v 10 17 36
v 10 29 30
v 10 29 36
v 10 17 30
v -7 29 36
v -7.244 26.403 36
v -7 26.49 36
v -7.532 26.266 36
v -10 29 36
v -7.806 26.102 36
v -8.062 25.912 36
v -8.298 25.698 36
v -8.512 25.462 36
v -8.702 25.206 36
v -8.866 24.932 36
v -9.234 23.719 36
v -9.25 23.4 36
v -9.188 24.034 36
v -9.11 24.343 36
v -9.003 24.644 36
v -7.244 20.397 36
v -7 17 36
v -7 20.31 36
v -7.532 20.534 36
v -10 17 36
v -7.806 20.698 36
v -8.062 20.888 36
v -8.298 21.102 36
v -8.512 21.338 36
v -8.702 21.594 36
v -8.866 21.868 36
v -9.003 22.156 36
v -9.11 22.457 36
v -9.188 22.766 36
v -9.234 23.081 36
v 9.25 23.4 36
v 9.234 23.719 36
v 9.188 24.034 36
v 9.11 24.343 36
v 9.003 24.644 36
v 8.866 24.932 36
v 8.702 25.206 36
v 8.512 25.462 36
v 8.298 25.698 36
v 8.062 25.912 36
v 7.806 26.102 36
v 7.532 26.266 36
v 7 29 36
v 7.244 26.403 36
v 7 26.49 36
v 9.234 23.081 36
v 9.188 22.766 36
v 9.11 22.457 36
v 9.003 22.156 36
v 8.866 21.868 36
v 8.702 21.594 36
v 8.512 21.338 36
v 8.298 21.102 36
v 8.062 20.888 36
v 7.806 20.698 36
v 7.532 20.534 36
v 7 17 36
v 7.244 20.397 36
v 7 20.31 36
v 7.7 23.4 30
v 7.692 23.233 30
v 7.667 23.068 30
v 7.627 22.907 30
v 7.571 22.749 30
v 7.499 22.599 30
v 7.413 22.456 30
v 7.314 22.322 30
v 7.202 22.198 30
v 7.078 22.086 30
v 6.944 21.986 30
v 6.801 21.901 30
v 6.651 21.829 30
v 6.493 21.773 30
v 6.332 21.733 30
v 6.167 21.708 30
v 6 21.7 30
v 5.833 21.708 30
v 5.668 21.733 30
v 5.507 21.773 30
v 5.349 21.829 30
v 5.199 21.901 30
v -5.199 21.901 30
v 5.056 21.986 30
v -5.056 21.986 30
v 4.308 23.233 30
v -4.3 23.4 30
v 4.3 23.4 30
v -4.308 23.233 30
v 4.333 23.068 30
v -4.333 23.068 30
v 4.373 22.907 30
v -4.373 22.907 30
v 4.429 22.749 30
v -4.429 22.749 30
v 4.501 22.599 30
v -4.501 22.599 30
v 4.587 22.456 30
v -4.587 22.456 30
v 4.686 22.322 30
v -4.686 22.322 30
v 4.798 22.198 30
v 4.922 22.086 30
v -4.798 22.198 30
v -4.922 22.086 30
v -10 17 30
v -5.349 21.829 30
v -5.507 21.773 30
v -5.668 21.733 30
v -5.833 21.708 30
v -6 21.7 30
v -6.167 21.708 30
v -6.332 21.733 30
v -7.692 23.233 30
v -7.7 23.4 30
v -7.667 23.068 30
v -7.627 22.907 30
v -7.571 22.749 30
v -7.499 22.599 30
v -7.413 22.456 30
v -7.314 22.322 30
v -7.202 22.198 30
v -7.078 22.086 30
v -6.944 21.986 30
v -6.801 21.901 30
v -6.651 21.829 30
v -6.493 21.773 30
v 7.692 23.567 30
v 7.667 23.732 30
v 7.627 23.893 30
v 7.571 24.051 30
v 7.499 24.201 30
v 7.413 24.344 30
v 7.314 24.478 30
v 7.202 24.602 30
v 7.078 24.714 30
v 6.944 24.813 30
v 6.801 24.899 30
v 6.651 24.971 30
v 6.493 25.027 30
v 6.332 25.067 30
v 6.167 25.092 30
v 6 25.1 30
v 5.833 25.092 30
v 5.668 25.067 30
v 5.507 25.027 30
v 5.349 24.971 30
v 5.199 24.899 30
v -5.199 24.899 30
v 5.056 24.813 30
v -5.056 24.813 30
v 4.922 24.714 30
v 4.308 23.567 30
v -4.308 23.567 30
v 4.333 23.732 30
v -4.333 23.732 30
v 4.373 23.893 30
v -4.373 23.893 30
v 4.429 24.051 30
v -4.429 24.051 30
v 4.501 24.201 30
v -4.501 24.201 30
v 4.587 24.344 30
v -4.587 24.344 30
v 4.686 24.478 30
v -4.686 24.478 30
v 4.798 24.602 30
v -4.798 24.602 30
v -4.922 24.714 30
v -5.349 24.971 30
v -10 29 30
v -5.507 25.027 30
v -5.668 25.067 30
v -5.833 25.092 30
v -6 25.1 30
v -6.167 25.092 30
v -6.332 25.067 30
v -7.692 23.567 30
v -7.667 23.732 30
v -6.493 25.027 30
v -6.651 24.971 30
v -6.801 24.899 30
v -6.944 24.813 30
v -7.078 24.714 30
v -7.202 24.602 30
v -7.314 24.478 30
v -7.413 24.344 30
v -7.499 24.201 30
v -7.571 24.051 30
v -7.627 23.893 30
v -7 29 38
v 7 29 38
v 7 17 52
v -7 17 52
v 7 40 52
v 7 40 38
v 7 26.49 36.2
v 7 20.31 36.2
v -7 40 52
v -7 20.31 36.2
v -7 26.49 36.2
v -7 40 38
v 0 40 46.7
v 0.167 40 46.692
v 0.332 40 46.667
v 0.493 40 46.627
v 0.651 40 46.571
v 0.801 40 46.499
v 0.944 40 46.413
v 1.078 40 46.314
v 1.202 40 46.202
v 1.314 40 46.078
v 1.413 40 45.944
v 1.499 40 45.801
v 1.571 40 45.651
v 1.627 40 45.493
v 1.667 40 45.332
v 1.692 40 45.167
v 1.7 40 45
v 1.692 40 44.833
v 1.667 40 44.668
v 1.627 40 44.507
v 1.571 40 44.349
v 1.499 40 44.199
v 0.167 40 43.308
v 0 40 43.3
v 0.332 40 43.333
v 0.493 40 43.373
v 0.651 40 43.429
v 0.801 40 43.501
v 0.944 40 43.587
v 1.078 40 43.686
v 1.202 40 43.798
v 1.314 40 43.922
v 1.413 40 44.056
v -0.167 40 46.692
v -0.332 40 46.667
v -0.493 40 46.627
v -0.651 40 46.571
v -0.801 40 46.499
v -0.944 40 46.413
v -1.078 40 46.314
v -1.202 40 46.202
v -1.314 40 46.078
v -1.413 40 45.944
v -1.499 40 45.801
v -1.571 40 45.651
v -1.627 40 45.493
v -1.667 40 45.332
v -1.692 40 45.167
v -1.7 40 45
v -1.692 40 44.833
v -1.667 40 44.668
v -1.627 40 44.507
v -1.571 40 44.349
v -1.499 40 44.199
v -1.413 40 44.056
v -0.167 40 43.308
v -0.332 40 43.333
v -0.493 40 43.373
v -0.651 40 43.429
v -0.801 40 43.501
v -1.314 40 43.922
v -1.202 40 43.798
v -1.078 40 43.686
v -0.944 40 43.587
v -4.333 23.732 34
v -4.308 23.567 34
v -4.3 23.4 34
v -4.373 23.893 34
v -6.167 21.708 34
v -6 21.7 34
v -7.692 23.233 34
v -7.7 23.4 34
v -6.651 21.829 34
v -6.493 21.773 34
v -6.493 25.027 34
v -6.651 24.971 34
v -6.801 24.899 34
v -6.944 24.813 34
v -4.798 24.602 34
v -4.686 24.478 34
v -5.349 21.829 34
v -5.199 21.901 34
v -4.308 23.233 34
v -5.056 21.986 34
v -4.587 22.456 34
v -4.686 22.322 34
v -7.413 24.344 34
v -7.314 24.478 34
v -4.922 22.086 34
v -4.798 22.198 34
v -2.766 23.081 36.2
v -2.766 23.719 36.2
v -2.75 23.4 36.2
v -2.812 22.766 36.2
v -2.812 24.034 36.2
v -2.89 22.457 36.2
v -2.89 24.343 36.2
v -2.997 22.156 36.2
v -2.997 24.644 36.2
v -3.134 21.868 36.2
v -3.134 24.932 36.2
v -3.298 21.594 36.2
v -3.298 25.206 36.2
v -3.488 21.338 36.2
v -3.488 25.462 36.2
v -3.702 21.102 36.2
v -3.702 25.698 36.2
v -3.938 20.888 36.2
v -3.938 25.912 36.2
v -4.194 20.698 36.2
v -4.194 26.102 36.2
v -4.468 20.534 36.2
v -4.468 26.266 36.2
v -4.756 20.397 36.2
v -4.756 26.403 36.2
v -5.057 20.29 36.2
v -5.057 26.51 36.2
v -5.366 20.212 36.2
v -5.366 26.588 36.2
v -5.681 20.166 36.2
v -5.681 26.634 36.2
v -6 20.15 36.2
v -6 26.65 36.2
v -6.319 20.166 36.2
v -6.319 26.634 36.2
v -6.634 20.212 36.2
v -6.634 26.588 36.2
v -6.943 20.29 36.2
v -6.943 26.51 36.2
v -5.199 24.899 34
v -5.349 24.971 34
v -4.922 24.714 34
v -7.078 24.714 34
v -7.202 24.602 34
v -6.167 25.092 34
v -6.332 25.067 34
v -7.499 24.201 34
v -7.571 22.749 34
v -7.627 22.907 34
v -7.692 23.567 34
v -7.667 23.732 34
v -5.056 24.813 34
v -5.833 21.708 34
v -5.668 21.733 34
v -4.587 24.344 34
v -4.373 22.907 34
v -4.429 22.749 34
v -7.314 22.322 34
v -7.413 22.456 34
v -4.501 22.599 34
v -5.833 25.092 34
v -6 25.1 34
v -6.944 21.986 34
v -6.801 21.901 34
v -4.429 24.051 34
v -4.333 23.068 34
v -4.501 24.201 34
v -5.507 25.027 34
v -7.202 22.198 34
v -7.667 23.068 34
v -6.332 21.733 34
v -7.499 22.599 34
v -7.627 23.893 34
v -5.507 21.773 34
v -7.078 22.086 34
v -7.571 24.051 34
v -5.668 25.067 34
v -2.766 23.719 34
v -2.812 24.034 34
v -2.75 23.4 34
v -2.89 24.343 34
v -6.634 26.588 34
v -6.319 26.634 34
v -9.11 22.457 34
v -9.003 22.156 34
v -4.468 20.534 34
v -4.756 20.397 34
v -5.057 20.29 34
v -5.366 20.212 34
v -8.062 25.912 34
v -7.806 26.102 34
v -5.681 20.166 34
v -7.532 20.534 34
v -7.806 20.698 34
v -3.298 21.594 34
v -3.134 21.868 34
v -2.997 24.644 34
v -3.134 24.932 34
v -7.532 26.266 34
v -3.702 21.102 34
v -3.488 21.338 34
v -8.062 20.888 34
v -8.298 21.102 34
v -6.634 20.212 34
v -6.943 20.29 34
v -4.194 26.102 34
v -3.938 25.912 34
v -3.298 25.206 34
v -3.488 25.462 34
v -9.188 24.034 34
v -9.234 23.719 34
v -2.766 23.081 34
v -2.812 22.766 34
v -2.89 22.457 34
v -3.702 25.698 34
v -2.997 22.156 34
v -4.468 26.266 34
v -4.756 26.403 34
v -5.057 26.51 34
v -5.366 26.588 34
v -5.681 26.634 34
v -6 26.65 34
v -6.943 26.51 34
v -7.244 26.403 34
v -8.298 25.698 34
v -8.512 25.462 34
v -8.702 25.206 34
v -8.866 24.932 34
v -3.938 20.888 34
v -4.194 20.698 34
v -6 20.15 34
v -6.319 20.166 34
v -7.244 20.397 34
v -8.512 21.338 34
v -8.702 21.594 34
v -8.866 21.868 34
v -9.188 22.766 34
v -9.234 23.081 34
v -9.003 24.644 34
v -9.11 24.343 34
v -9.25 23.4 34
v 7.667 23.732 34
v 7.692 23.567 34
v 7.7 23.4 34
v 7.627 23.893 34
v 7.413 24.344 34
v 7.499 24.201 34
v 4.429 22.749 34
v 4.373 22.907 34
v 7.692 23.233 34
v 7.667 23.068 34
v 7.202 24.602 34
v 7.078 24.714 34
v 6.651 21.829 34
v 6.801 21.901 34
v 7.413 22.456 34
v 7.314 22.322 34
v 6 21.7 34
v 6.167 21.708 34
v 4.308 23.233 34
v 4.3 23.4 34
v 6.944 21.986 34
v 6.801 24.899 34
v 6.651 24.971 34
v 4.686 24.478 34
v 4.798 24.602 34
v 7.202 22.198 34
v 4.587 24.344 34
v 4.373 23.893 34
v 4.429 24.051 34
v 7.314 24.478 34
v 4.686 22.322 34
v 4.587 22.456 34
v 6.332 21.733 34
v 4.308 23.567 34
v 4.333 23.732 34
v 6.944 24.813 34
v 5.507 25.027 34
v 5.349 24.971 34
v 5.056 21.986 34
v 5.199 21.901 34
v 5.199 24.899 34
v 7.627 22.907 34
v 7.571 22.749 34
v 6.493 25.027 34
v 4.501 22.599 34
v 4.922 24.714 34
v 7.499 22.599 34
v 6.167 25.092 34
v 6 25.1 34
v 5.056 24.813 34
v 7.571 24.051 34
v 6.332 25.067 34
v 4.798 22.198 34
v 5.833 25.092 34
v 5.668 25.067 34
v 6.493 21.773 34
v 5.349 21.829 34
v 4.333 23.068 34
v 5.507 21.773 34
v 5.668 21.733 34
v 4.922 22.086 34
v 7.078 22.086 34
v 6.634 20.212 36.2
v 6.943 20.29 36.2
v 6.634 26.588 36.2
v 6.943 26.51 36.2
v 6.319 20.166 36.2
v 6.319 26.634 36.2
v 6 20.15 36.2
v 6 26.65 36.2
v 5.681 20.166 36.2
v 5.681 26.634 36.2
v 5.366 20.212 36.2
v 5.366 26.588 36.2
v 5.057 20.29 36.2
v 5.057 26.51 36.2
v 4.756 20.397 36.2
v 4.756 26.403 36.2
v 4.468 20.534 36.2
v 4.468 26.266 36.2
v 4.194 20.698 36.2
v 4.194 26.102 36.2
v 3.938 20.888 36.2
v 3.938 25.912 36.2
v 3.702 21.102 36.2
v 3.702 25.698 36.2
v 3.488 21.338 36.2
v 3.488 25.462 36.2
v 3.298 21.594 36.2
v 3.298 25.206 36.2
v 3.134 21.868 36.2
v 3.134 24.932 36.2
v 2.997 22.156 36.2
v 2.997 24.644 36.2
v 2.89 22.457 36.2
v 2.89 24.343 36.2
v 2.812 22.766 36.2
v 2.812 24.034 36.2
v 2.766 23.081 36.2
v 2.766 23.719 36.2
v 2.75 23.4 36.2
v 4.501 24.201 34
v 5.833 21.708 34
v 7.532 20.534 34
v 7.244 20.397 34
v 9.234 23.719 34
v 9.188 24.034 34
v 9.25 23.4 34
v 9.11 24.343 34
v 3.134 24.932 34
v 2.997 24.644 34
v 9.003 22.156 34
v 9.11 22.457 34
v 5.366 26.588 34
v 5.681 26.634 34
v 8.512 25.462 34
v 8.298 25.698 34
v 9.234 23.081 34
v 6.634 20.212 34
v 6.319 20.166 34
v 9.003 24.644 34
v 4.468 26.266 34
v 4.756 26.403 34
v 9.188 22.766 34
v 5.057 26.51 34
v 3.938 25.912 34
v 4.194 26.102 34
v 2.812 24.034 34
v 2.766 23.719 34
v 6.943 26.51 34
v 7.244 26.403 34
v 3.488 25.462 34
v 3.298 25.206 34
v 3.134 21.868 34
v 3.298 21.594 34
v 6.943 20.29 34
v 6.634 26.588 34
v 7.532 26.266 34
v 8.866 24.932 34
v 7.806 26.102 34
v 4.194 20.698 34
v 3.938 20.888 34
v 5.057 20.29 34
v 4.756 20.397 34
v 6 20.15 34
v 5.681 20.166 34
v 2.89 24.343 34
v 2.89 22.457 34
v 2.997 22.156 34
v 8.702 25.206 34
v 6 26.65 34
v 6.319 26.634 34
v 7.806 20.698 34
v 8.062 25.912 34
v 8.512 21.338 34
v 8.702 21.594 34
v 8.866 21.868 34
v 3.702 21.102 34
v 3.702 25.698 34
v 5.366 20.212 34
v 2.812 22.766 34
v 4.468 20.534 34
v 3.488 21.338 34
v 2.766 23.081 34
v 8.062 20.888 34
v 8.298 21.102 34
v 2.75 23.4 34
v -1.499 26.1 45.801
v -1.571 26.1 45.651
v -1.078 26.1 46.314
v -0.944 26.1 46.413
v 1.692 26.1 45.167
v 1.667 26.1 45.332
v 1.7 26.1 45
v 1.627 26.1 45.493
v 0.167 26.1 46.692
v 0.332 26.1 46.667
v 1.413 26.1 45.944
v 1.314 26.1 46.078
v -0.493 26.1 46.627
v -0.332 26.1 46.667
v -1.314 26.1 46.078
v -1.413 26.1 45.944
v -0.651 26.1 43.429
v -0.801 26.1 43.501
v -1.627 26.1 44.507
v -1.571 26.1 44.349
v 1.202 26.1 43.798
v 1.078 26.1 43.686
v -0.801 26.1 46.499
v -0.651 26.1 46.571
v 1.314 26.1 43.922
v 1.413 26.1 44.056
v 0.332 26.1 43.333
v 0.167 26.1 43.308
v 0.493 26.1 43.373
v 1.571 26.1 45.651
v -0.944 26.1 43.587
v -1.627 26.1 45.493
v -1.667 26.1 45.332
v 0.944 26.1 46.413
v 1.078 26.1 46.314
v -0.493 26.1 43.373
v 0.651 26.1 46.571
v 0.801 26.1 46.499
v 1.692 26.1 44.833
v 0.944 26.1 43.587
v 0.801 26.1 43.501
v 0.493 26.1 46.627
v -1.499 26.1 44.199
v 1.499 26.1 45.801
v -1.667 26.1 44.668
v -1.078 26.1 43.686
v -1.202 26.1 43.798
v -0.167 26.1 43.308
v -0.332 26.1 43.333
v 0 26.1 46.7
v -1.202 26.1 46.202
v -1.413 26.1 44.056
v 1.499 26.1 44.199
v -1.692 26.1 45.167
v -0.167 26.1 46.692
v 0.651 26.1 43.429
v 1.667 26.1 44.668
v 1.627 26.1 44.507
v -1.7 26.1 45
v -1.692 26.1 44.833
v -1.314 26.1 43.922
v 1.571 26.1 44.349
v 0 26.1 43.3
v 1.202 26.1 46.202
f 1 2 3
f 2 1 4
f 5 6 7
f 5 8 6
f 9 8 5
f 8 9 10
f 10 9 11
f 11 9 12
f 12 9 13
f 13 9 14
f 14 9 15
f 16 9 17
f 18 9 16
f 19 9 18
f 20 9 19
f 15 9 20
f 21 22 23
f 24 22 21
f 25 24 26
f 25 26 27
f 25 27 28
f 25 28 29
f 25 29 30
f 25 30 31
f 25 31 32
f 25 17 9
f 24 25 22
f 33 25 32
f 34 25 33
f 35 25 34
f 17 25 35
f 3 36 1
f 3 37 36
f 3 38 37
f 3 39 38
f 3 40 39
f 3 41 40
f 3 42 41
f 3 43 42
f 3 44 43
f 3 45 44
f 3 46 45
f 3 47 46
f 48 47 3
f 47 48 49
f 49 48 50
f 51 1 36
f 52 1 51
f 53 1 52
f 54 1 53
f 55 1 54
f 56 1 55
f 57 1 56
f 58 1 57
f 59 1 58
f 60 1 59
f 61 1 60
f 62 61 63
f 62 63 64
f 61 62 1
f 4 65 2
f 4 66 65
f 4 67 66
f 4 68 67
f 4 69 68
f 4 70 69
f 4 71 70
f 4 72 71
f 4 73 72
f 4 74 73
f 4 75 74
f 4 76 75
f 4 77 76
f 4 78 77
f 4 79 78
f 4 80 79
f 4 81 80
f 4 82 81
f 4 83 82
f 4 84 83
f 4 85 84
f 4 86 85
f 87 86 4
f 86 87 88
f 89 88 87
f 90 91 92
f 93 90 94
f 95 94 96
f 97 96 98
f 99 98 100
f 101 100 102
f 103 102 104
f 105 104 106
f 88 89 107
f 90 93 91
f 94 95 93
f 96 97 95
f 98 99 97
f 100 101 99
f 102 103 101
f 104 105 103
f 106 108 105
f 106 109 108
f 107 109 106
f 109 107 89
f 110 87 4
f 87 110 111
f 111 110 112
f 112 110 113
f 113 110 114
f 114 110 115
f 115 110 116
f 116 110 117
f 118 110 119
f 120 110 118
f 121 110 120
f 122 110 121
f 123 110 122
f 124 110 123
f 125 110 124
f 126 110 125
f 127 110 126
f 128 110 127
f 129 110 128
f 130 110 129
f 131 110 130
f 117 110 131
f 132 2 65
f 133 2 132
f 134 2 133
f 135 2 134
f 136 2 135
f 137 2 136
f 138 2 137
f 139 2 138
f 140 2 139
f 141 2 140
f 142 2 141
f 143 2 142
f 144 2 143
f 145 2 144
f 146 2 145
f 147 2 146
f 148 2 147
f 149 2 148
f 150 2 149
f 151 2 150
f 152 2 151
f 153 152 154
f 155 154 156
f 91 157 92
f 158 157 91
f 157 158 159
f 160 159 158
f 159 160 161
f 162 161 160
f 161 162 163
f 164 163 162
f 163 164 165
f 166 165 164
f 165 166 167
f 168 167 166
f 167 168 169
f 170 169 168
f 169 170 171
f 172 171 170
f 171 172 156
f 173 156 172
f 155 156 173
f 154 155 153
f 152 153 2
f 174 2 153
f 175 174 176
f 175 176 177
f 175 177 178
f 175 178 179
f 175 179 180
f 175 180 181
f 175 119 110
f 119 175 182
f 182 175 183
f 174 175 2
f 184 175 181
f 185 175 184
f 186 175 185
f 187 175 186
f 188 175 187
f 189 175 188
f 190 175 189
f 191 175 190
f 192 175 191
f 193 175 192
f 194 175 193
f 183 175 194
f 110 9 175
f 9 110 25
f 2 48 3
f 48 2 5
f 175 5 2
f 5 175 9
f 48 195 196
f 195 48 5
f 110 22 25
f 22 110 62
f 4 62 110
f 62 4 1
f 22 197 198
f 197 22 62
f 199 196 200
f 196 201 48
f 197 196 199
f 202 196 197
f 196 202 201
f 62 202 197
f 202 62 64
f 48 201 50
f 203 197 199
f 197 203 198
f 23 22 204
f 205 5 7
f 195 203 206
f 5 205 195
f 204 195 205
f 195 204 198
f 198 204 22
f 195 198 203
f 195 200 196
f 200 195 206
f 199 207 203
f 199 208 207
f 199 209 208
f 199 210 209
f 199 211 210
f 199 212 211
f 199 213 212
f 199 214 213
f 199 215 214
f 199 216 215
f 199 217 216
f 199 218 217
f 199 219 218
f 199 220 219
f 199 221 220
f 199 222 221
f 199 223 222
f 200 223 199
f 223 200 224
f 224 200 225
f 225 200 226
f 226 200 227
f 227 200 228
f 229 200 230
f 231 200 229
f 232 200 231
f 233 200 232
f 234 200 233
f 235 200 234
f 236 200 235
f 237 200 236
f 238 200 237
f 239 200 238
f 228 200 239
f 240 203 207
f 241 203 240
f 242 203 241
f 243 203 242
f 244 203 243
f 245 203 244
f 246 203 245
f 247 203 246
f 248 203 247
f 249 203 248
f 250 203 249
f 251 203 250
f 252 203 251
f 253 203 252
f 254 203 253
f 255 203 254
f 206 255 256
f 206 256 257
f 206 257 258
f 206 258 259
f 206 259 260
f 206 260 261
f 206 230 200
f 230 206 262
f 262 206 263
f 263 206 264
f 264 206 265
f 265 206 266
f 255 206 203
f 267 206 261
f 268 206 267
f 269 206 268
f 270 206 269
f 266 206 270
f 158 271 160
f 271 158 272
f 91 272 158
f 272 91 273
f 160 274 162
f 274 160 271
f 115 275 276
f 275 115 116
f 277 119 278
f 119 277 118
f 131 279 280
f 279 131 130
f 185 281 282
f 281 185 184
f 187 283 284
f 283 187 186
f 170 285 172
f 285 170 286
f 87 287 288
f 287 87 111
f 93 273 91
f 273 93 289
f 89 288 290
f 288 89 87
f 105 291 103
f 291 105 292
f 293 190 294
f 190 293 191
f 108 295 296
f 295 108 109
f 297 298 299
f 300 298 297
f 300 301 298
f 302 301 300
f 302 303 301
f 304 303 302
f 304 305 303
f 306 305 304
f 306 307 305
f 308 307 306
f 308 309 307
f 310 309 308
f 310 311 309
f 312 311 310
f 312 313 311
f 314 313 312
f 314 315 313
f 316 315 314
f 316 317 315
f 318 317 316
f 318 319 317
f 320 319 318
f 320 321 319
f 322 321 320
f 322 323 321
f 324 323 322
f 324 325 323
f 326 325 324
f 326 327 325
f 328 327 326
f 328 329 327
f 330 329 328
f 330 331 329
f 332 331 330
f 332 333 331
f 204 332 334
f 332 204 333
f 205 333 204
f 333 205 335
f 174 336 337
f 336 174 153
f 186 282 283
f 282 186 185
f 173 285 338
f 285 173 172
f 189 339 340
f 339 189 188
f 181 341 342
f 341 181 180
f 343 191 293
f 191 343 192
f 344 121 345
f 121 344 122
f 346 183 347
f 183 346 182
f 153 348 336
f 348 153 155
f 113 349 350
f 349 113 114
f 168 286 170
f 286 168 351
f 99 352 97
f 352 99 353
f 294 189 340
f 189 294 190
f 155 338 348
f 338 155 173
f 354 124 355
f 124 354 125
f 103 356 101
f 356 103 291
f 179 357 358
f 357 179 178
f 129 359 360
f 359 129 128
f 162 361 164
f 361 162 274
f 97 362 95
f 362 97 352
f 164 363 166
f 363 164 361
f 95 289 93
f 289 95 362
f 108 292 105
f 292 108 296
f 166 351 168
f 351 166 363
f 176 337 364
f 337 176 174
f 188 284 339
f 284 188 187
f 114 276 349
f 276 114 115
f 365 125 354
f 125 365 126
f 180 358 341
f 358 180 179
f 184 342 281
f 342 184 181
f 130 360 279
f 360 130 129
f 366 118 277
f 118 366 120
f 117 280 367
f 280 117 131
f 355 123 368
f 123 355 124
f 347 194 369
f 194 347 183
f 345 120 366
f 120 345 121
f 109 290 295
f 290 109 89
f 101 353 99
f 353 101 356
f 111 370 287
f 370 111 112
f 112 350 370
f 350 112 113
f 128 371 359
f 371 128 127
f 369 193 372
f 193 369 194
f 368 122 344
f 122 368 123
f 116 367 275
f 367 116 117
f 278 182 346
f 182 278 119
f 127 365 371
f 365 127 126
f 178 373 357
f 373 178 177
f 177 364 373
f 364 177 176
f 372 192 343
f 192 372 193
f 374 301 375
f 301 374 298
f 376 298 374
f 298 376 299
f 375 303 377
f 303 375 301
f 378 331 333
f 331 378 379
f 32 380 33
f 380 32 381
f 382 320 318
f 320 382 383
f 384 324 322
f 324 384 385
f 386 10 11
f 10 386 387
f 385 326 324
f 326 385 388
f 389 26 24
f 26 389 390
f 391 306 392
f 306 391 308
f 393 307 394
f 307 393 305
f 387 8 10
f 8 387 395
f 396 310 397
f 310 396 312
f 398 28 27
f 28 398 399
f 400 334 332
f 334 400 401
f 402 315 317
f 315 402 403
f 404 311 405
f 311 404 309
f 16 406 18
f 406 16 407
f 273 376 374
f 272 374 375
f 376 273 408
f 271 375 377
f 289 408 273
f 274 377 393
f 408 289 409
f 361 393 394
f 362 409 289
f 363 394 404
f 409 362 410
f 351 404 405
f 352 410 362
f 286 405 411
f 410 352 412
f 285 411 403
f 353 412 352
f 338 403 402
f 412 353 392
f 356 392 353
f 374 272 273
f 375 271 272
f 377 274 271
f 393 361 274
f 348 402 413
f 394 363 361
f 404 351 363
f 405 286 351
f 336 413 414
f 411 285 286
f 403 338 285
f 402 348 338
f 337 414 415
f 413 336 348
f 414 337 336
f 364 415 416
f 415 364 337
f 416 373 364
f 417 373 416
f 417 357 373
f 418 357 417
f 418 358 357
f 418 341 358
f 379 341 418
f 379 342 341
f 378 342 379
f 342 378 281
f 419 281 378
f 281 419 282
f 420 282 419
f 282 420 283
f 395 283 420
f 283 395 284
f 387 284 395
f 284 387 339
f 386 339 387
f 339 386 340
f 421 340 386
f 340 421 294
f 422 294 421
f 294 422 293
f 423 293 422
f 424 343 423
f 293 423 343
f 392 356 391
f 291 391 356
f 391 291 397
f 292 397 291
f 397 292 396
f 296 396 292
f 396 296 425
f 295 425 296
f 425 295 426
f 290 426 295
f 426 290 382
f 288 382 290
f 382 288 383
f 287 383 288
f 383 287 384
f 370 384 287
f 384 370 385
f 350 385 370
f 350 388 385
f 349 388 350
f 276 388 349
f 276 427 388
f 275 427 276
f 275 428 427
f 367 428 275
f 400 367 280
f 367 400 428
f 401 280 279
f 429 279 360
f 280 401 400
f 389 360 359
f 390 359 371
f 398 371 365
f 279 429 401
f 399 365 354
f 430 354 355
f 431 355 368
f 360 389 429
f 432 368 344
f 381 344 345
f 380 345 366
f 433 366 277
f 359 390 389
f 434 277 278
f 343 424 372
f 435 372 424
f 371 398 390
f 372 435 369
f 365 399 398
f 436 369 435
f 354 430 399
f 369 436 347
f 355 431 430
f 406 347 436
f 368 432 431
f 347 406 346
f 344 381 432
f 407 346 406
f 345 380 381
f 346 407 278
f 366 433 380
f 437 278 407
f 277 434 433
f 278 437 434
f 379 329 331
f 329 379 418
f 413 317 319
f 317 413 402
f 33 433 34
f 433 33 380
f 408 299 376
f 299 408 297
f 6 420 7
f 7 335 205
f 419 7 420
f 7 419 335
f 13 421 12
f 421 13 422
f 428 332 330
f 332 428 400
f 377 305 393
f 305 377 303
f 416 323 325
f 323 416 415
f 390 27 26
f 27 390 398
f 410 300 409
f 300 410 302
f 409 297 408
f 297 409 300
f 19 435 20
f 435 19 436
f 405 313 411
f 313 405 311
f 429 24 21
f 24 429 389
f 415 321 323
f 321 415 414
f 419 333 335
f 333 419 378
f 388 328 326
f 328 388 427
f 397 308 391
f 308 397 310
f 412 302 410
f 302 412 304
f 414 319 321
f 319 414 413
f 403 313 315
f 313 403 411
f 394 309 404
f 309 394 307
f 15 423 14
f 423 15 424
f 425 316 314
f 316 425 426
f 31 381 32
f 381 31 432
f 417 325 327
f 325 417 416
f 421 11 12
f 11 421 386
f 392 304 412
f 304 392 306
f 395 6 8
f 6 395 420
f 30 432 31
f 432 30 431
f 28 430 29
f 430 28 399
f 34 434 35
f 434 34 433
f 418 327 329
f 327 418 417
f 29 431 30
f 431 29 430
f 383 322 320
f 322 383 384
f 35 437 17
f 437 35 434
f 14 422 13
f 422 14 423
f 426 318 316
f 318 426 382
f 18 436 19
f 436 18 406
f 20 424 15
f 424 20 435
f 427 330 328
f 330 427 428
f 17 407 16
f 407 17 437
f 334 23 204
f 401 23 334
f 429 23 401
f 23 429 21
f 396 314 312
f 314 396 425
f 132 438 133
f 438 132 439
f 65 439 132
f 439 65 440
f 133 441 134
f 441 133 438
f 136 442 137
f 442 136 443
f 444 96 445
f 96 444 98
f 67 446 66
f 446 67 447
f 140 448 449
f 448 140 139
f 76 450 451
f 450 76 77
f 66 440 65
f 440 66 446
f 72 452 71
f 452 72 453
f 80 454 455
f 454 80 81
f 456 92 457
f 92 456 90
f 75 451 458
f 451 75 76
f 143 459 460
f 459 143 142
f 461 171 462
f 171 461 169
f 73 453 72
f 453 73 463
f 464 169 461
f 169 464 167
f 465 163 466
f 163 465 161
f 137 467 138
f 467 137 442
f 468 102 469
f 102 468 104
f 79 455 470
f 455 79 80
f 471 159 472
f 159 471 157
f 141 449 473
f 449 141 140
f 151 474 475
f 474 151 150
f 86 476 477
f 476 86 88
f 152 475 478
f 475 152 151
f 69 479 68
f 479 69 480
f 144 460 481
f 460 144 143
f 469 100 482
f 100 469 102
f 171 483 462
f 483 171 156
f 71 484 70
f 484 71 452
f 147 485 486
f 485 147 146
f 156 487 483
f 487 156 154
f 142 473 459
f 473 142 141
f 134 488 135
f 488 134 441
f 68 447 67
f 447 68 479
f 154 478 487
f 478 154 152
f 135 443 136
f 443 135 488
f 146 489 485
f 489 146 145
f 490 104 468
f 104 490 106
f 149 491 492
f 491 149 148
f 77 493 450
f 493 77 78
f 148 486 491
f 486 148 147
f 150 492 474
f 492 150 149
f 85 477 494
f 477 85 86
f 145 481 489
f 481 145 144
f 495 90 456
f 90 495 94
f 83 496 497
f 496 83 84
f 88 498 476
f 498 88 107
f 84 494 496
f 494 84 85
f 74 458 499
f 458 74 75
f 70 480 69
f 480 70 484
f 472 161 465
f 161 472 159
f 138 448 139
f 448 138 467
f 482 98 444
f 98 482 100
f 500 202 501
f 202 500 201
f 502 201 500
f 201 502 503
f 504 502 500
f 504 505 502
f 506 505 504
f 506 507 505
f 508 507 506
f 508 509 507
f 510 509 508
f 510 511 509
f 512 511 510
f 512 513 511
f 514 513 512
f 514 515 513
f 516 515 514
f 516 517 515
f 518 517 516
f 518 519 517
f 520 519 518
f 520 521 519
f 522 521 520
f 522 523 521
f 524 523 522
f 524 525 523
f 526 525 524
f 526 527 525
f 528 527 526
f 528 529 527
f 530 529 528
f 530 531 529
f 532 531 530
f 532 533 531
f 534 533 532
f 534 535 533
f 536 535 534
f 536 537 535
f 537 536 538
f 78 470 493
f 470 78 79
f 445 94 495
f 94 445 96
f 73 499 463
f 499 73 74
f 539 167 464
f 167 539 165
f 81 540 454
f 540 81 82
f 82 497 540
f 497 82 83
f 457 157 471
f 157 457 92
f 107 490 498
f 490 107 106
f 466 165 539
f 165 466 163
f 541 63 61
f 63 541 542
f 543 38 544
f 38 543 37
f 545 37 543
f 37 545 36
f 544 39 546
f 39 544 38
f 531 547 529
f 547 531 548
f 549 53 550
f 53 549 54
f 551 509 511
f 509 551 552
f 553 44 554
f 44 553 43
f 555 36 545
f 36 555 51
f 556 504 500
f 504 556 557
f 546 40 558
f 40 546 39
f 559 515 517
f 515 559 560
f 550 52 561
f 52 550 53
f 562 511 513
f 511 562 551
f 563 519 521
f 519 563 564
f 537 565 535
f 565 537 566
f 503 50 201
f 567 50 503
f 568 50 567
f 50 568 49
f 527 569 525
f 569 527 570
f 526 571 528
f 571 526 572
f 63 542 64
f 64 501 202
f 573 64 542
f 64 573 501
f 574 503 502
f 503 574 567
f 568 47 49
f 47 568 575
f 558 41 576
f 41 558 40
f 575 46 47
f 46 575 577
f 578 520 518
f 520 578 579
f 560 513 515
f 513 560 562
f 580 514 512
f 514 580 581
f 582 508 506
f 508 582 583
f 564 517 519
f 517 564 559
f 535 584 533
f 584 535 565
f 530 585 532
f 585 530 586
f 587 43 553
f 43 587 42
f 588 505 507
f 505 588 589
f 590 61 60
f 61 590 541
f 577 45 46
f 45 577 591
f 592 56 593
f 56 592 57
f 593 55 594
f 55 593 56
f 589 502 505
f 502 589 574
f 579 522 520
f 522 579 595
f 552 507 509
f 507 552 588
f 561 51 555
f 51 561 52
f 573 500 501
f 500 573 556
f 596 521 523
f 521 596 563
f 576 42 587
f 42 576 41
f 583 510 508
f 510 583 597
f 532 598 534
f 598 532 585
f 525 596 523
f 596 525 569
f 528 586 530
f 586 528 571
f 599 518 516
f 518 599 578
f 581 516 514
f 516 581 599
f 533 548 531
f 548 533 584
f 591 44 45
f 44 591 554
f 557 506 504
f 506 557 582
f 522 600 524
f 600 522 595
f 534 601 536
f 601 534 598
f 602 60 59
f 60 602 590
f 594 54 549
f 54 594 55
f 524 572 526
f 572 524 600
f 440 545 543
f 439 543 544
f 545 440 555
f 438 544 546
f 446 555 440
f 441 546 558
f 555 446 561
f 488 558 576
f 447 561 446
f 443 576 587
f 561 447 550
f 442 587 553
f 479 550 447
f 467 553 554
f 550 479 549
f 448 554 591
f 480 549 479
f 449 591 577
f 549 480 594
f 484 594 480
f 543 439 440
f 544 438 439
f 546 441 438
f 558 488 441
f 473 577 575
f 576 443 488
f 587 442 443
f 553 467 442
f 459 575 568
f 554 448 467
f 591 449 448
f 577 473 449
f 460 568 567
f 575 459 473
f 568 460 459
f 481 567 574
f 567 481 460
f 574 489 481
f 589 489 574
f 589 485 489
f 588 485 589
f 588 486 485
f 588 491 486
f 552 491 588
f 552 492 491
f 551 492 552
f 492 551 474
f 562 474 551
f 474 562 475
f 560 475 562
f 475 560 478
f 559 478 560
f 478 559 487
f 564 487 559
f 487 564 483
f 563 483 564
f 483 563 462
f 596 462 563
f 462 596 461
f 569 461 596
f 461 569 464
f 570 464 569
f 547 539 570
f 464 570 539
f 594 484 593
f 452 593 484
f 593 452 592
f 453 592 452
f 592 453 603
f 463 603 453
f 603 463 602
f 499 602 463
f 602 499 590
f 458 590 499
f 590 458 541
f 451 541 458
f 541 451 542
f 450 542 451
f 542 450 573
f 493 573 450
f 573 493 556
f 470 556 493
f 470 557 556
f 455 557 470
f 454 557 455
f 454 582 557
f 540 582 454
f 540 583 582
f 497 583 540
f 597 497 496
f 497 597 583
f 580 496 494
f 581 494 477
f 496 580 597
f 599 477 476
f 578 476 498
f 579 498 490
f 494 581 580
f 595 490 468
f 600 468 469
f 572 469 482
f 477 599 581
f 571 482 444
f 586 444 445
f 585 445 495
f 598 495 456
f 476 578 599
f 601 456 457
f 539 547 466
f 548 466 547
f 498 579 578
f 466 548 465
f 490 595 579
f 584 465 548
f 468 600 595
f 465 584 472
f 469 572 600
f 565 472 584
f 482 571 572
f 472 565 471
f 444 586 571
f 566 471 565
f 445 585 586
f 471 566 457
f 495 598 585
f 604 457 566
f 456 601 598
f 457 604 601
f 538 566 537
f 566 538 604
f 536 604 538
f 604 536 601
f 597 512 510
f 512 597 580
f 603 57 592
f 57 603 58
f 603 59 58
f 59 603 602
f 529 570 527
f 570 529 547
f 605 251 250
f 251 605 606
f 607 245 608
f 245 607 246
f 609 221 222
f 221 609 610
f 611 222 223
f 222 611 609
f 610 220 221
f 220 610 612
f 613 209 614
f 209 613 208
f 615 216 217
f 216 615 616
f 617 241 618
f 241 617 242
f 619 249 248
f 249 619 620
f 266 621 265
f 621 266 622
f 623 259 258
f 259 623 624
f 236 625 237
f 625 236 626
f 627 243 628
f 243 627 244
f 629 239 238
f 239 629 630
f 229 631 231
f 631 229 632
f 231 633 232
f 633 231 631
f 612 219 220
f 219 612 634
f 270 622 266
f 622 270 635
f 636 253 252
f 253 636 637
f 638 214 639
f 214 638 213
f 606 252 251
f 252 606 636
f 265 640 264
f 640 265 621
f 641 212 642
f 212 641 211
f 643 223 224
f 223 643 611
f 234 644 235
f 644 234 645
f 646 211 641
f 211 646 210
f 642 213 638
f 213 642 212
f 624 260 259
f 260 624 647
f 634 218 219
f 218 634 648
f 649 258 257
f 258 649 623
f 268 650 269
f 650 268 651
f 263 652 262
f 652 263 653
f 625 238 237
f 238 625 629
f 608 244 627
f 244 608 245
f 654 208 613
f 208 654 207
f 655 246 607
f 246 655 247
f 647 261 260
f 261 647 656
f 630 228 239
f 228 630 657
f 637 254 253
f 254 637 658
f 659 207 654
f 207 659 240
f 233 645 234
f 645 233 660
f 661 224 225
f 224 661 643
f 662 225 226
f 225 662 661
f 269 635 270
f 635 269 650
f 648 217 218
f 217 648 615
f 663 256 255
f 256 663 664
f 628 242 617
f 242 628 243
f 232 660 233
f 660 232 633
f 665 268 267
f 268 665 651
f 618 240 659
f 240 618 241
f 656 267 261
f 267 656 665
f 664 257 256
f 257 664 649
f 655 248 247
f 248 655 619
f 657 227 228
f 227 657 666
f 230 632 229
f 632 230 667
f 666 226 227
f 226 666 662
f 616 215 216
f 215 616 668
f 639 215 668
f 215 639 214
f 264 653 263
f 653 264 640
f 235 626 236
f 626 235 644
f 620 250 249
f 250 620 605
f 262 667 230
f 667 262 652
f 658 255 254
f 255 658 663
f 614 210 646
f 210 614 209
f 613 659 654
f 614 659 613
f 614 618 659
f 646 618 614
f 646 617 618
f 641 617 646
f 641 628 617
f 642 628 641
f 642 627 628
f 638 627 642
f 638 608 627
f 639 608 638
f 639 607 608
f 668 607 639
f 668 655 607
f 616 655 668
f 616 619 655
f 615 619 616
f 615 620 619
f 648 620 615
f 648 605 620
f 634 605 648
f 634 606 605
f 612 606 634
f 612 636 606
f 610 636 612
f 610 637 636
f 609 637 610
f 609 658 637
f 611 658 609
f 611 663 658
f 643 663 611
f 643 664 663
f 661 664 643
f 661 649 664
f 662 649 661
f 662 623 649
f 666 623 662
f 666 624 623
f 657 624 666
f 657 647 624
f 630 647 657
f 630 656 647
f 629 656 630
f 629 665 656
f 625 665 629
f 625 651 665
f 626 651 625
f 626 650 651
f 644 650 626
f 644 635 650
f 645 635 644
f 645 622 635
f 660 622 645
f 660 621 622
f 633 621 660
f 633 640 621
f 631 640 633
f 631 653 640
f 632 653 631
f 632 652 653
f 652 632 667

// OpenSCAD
// file: ../lib/utils.scad
// 공통 모듈 (common modules) — 베어링 시트, 볼트 홀 등
include <../config/parameters.scad>

// 베어링 시트 (bearing seat): 압입 공차 적용 포켓
// brg = [내경, 외경, 폭] (예: BRG_608ZZ)
module bearing_seat(brg) {
    cylinder(d = brg[1] + bearing_press_fit, h = brg[2]);
}

// 베어링 시트 + 내륜 도피 홀 (관통)
// wall = 시트 아래 받침 두께
module bearing_pocket(brg, wall = 2) {
    union() {
        translate([0, 0, wall]) bearing_seat(brg);
        // 내륜 접촉 방지: 내경보다 크고 외경보다 작은 도피 홀
        cylinder(d = (brg[0] + brg[1]) / 2, h = wall + 0.1);
    }
}

// 관통 볼트 홀 (clearance hole)
module bolt_hole(d, h) {
    cylinder(d = d + bolt_hole_oversize, h = h);
}

// NEMA 17 모터 마운트 홀 패턴 (CON-004: SF24 = 42각 NEMA 17 호환)
// h = 판 두께
module nema17_mount(h) {
    union() {
        cylinder(d = nema17_pilot_d + clearance_fit, h = h);
        for (x = [-1, 1], y = [-1, 1])
            translate([x * nema17_hole_pitch / 2, y * nema17_hole_pitch / 2, 0])
                bolt_hole(nema17_bolt_d, h);
    }
}

// 숄더 볼트 피벗 홀 (CON-001)
// d = 숄더 직경 (shoulder_d_small | shoulder_d_large)
module pivot_hole(d, h) {
    cylinder(d = d + clearance_fit, h = h);
}

// 베어링 보스 (bearing boss): 출력물 허브에 베어링 내경 직접 안착 (CON-003)
// 내경 기준 압입 — bearing_press_fit(음수)만큼 키운다
module bearing_boss(brg, h) {
    cylinder(d = brg[0] - bearing_press_fit, h = h);
}

// 육각 너트 포켓 (nut pocket) — 차집합용. af = 평면폭(across flats)
module nut_pocket(af, t) {
    cylinder(d = (af + clearance_fit) / cos(30), h = t, $fn = 6);
}

// 리미트 스위치 장착 홀 쌍 (ELE-004) — 차집합용, X축 방향 피치
module ls_mount_holes(h) {
    for (x = [-1, 1])
        translate([x * ls_hole_pitch / 2, 0, 0])
            cylinder(d = ls_hole_d, h = h);
}

// 케이블 가이드 클립 (ELE-005) — 외면 부착형 C-클립, cable_d 다발 직경
module cable_clip(cable_d = 8, t = 4) {
    wall = 2.5;
    difference() {
        cylinder(d = cable_d + 2 * wall, h = t);
        translate([0, 0, -0.1]) cylinder(d = cable_d, h = t + 0.2);
        // 삽입 개구 (개구 폭 = 케이블 직경의 70%)
        translate([0, -cable_d * 0.35, -0.1])
            cube([cable_d, cable_d * 0.7, t + 0.2]);
    }
}

// 평행/구동 링크 바 (625ZZ 양단, MEC-002/MEC-001a)
// len = 피벗 간 거리. 보스 상면에서 베어링 압입, 하면 내륜 도피 홀.
module link_bar(len) {
    boss_t = BRG_625ZZ[2] + 4;
    difference() {
        union() {
            translate([0, -link_bar_w / 2, (boss_t - link_bar_t) / 2])
                cube([len, link_bar_w, link_bar_t]);
            for (x = [0, len])
                translate([x, 0, 0]) cylinder(d = link_boss_d, h = boss_t);
        }
        for (x = [0, len]) {
            translate([x, 0, boss_t - BRG_625ZZ[2]])
                bearing_seat([BRG_625ZZ[0], BRG_625ZZ[1], BRG_625ZZ[2] + 0.1]);
            translate([x, 0, -0.1])
                cylinder(d = (BRG_625ZZ[0] + BRG_625ZZ[1]) / 2, h = boss_t + 0.2);
        }
    }
}

// 지시선(leader) + 빌보드(billboard) 라벨 — 프리뷰용, $vpr 카메라 추종
// p = 앵커(부품 측), v = 지시선 벡터 (라벨은 p+v 위치)
// 주의: 상위 프레임이 회전된 경우 빌보드가 카메라를 향하지 않음 — 월드 프레임에서 호출할 것
module leader_label(p, v, txt, size = 3.2, col = "white") {
    color(col) {
        hull() {
            translate(p) sphere(d = 1.4, $fn = 12);
            translate(p + v) sphere(d = 1.4, $fn = 12);
        }
        translate(p + v) rotate($vpr) translate([2, -size / 2, 0])
            linear_extrude(0.6) text(txt, size = size);
    }
}

// 축 클램프 슬릿 + M3 핀치 볼트 (차집합용)
// bore_d = 클램프 보어, depth = 보어 깊이, body_d = 보스 외경
module shaft_clamp_cut(bore_d, depth, body_d) {
    union() {
        cylinder(d = bore_d + clearance_fit / 2, h = depth);
        // 슬릿
        translate([-1, 0, -0.1]) cube([2, body_d / 2 + 1, depth + 0.1]);
        // M3 핀치 볼트 (슬릿 직교) — 보어 반경과 보스 반경 사이
        translate([0, (bore_d / 2 + body_d / 2) / 2 + 1, depth / 2])
            rotate([0, 90, 0])
                translate([0, 0, -body_d / 2 - 1])
                    bolt_hole(3, body_d + 2);
    }
}
// file: ../config/parameters.scad
// cobot-lite 전역 파라미터 (global parameters)
// 모든 부품 치수는 이 파일에서만 정의한다 — 매직 넘버 하드코딩 금지 (MEC-008)

/* ===== 출력/렌더링 ===== */
$fn = 64;

/* ===== 공통 가공 여유 (파생 치수에서 참조 — 선행 정의 필수) ===== */
clearance_fit = 0.3;      // 회전/슬라이드 끼움 여유
bolt_hole_oversize = 0.4; // 관통 볼트 홀 여유

/* ===== 베어링 (bearing) — CON-002: 이 4종만 사용 =====
   [내경, 외경, 폭] mm */
BRG_608ZZ  = [8,  22, 7];   // 관절 피벗 (8mm 숄더 볼트)
BRG_625ZZ  = [5,  16, 5];   // 평행 링크 피벗 (5mm 숄더 볼트)
BRG_6805ZZ = [25, 37, 7];   // 손목 롤 축, 중구경 허브
BRG_6810ZZ = [50, 65, 7];   // 베이스 턴테이블 메인 베어링

// 베어링 압입 공차 (press-fit tolerance) — MFG-002
// 외경 기준 -0.1 ~ -0.2mm. 프린터별 보정은 이 변수 하나로 조정한다.
bearing_press_fit = -0.15;

/* ===== 숄더 볼트 (stripper/shoulder bolt) — CON-001 ===== */
shoulder_d_small = 5;   // 625ZZ 결합
shoulder_d_large = 8;   // 608ZZ 결합

/* ===== 링크 길이 — MEC-006 [TBD-4] =====
   리치 500mm 잠정. 비대칭 분할 (J2 자중 부담 보상, MEC-001a 분담 구조) */
L1 = 225;   // 상완 (upper arm): J2 축 → J3 축
L2 = 275;   // 하완 (forearm): J3 축 → 공구 플랜지

/* ===== 링크 꺾임 (팔레타이저식 구조 오프셋) =====
   관절 축 좌표는 불변(직선 L1/L2 기준) — 꺾임은 빔 형상만 변경.
   목적: ① 신장/접힘 한계 자세에서 빔-빔 간섭 여유 확보
        ② 구조 외곽을 축선 위로 올려 저자세 작업 시 팔꿈치 하부 돌출 감소
   니(knee) 수직 오프셋 h = L·pos·(1-pos)·tan(deg) */
ua_bend_deg = 12;     // 상완 꺾임각 (0 = 직선)
ua_bend_pos = 0.68;   // 꺾임 위치 (0~1, J2 기준) — 분할 조인트(95~131) 뒤
fa_bend_deg = 12;     // 하완 꺾임각
fa_bend_pos = 0.5;    // 꺾임 위치 (팔꿈치 기준)

/* ===== 가동 엔벨로프 (소프트 리미트 권고값 — docs/design-notes.md) =====
   접힘각 = J3 - J2 (월드 피치 차).
   -90° = 평행사변형 구동 전동각(transmission angle) 특이점 (크랭크∥링크),
     0° = 완전 신장 특이점 (J2·J3·손목 일직선). 양쪽 모두 운용 금지 */
env_fold_min = -75;   // 접힘 한계 (전동각 sin25° ≈ 0.42 이상 확보)
env_fold_max = -3;    // 신장 한계 (리치 ≈ 499.5mm — 공칭 500 대비 -0.5)

// J3 모터 후방 배치 연장 길이 (MEC-001c)
// J2 액추에이터는 J2 축 동축 직결 (MEC-001b) — 후방 배치 대상은 J3 어셈블리만
// J1 회전 시 베이스·작업물 간섭 확인 필수
rear_extension = 80;    // J2 피벗 → J3 모터+기어박스 어셈블리 중심 [잠정]

/* ===== 턴테이블 (turntable) — MEC-003 ===== */
turntable_bearing_gap = 30;   // 6810ZZ 2개 축방향 이격, 30mm 이상 (SHOULD)

/* ===== 모터 (motor) — CON-004: 산요덴키 SF24 시리즈 =====
   NEMA 17 호환 42각 */
motor_frame = 42;             // 프레임 폭 (mm)
nema17_hole_pitch = 31;       // 고정 볼트 피치
nema17_pilot_d = 22;          // 센터 파일럿 직경
nema17_bolt_d = 3;            // M3

/* ===== 감속비 (gear ratio) — CON-005: 5/10/20만 허용 ===== */
// 주의: MG17-G10(10:1)은 허용 토크 5N·m로 급락 — 변경 시 토크 재검증 (docs/torque-budget.md)
ratio_J1 = 20;
ratio_J2 = 20;
ratio_J3 = 20;   // SF2423 + 20:1 확정 (TBD-3 해결)
ratio_J4 = 5;

/* ===== 기어박스 (gearbox) — MG17 데이터시트 (docs/tbd-research.md TBD-5) ===== */
gbx_frame = 42;            // NEMA 17 플랜지, 모터와 동일 42각
gbx_len_20to1 = 51;        // MG17-G20 길이 (J1~J3)
gbx_len_5to1  = 40;        // MG17-G5 길이 (J4)
gbx_out_shaft_d = 8;       // 출력축 직경
gbx_in_insert = 9.5;       // 입력 결합 깊이 — SF24 축 길이 호환 확인 항목
gbx_mass_20to1 = 400;      // g — 질량 예산 계산용
gbx_mass_5to1  = 350;      // g

/* ===== 모터 몸체 치수 — SF24 카탈로그 일반값 [잠정: 구매 데이터시트로 확인] ===== */
motor_len_SF2424 = 47;    // J1, J2
motor_len_SF2423 = 39;    // J3
motor_len_SF2422 = 33;    // J4
motor_shaft_d = 5;        // SF24 출력축 (MG17 입력 클램프 ⌀5)
gbx_out_shaft_len = 20;   // MG17 출력축 돌출 길이

/* ===== 베이스/J1 (MEC-003, MEC-005) ===== */
base_plate_size = 140;    // 정사각 베이스 플레이트 한 변
base_plate_t = 8;
base_bolt_d = 5;          // M5 ×4 작업대 고정 (MEC-005)
base_bolt_pitch = 120;    // 고정 볼트 피치
base_col_wall = 5;        // 턴테이블 칼럼 벽 두께
col_window_w = 50;        // 칼럼 측면 배선/조립 창 폭
turntable_top_d = 100;    // 턴테이블 상판 직경
turntable_top_t = 8;
j1_actuator_gap = 4;      // 베이스 플레이트 상면 → 모터 하면 여유
col_open_h = 24;          // 모터 플로어 상면 → 하부 베어링 (스템 결합·셋스크류 존)
j1_stem_d = 20;           // 턴테이블 허브 스템(출력축 결합부) 외경
set_screw_pilot_d = 3.4;  // M4 무두 볼트(set screw) 셀프태핑 파일럿
m3_tap_d = 2.8;           // M3 셀프태핑 파일럿 (앵커 등 소형 체결)
shoulder_mount_px = 80;   // 어깨 텅 ↔ 턴테이블 볼트 피치 X
shoulder_mount_py = 50;   // 어깨 텅 ↔ 턴테이블 볼트 피치 Y
shoulder_mount_bolt_d = 5;// M5 ×4
shoulder_tongue_x = 40;   // 어깨 텅 깊이(X) — 포크 내 스윕 간섭 한계 결정 (J2 ≈ ±55°)

/* ===== 암 단면/관절 (MEC-004) — v0.13 플레이트 아키텍처 =====
   원칙: 출력물은 평판(plate)만. 간격은 표준 스페이서 튜브 + 관통 볼트가
   결정 (일체 보스·웹·박스 금지). 관절 베어링은 플레이트에 직접 압입 —
   플레이트 두께 = 608ZZ 폭(7) */
arm_plate_t = 7;          // 측판 두께 = 608ZZ 폭 (베어링 인-플레이트 압입)
fork_standoff_len = 30;   // 표준 육각 스탠드오프 길이 (어깨 포크 갭 = 하완 내폭)
hex_standoff_af = 13;     // 두꺼운 육각 스탠드오프 평면폭 (M6 암-암)
joint_spacer_od = 12;     // 관절 스택 스페이서 튜브 외경 (숄더 ⌀8 위)
ua_split_x = 115;         // 상완 플레이트 분할선 (365 > 빌드 대각 한계)
ua_splice = [99, 131];    // 스플라이스 더블러 볼트 X 위치 (분할선 ±16)
// 어깨 텅(플레이트 스택) 폭 = 플레이트 14 ×2 + 표준 스탠드오프 30 (v0.13)
tongue_w = 28 + fork_standoff_len;          // 58
// 상완 포크 내폭 = 표준 육각 스탠드오프 L60 (전 스탠드오프 표준화 — v0.14).
// 텅 58과의 편차 1mm/측은 J2 스택 M8 와셔가 흡수 (CON-001 와셔 기존 품목)
arm_inner_w = 60;
arm_h = 50;               // 암 단면 높이
j2_axis_h = 90;           // 턴테이블 상면 → J2 축 높이
                          // — J2 +45° 시 후방 러그 하단 ↔ 어깨 플랜지 간섭 회피 (간섭 검사 확인)
j3_crank_len = 40;        // J3 크랭크 = 하완 혼 반경 (평행사변형 1:1)
pl_offset = 45;           // 수동 평행사변형(MEC-002) 피벗 오프셋
                          // — J2 모터 42각 코너 스윕 반경(≈30) + 여유
forearm_inner_w = fork_standoff_len;  // 하완 측판 내폭 = 표준 스탠드오프 30 (v0.13)
beam_w = 40;              // 상완/하완 중앙 보(beam) 폭
arm_lug_r = 26;           // 관절 러그(피벗 보스) 반경 — NEMA17 볼트 코너(r≈21.9) + 벽
beam_wall = 4;            // 보 쉘 벽 두께 (경량화)
pivot_engage = 14;        // 축 클램프/베어링 물림 깊이
crank_t = 8;              // J3 크랭크 암 두께
crank_hub_d = 20;         // 크랭크 허브 외경
crank_hub_w = 12;         // 크랭크 허브 폭
dl_offset = 8;            // 구동 링크 평면: 플레이트 A 외면 → 링크 중심 거리
ua_joint_x = 95;          // 상완 분할 조인트 위치 (MFG-004: 365mm > 빌드 대각 한계)
ua_lap = 36;              // 랩 조인트(소켓-테논) 물림 길이

/* ===== 너트 평면폭 (across flats) ===== */
m3_nut_af = 5.5;
m4_nut_af = 7;
m6_nut_af = 10;
link_bar_w = 12;          // 링크 바 단면 폭
link_bar_t = 6;           // 링크 바 단면 두께
link_boss_d = 24;         // 링크 단부 625ZZ 보스 외경 (625 외경 16 + 벽 4×2)

/* ===== 손목/공구 플랜지 (GEN-004) ===== */
wrist_offset = 50;        // 손목 피치 피벗 → J4(플랜지) 축 수평 오프셋
                          // — J4 모터 몸체 ↔ 하완 러그 스윕 간섭 회피 (≥ lug_r + 모터 반폭)
forearm_len = L2 - wrist_offset; // 팔꿈치 축 → 손목 피치 피벗
wrist_wall = 5;           // 손목 하우징 벽 두께
flange_d = 45;            // 공구 플랜지 직경
flange_t = 8;
flange_bc = 32;           // 그리퍼 볼트 서클
flange_bolt_d = 4;        // M4 ×4

/* ===== 리미트 스위치 (ELE-004) — KW12형 기계식 마이크로 기준품 ===== */
ls_body = [20, 10, 6.5];  // 몸체 [길이, 높이, 두께]
ls_hole_pitch = 9.5;      // 장착 홀 피치
ls_hole_d = 2.3;          // M2 셀프태핑/볼트

/* ===== 질량 산출 (MEC-007, docs/mass-budget.md) ===== */
petgcf_density = 1.30;    // g/cm³ (PETG-CF 카탈로그 일반값)
print_solidity = 0.6;     // 쉘+인필 유효 충전율 [잠정 — 슬라이서 추정으로 대체]
motor_mass_SF2424 = 510;  // g (산요 카탈로그 확정)
motor_mass_SF2423 = 380;
motor_mass_SF2422 = 300;

/* ===== 질량/성능 예산 ===== */
payload = 1.0;            // kg, 그리퍼 포함 정격 (PER-001)
moving_mass_budget = 0.8; // kg, 상완 이후 이동부 상한 (MEC-007)

/* ===== 출력 제약 — MFG-004 (Creality SparkX i7, TBD-8 해결) ===== */
build_volume = [260, 260, 255];
// main file
// 평행사변형 정적 핀 앵커 (parallelogram static-pin anchor) — MEC-002
// =====================================================================
// 어깨 텅 상단 시트(z=30 면)에 M3 ×2 체결. 링크 1의 접지(ground) 핀 제공.
// 좌표계: 어깨와 동일 (원점 = J2 축) — 조립 변환 불요.
// 분할 사유: 일체형 타워의 수평 암(+Y 돌출)이 직립 출력 시 하부 지지 불가
//   (하부는 상완 플레이트 B 스윕 존이라 웻지 금지) → 별도 부품을 측면(-X면)
//   눕혀 출력 = 전 형상 평면 내, 서포트 불요 (MFG-003)
// 형상 제약 (간섭 검사 근거, docs/design-notes.md §3):
//   · 수직부·베이스: y ≤ 29.7 (텅 폭 안)
//   · 수평 암: z ≥ pl_offset-7 (플레이트 B 상단 모서리 스윕 z_max ≈ 38 위)
// 하중: 링크 1 력 ≈ 13 N (손목 수평 유지 모멘트) — M3 ×2 전단으로 충분
include <../config/parameters.scad>
use <../lib/utils.scad>

anchor_face = arm_inner_w / 2 + arm_plate_t + dl_offset - 5; // 핀 면 (+Y) = 39

module pl_anchor() {
    difference() {
        union() {
            // 베이스 플레이트 (어깨 시트 z=30 위)
            translate([-10, 17, 30]) cube([20, tongue_w / 2 - 17, 6]);
            // 수직부 (텅 폭 안)
            translate([-7, 17, 30]) cube([14, tongue_w / 2 - 17, pl_offset + 7 - 30]);
            // 수평 암: 링크 평면까지 +Y 돌출 (z ≥ pl_offset-7)
            translate([-7, 17, pl_offset - 7]) cube([14, anchor_face - 17, 14]);
        }
        // 정적 핀: M4 파일럿 (+Y면, 5mm 숄더 볼트 체결)
        translate([0, anchor_face + 0.1, pl_offset]) rotate([90, 0, 0])
            cylinder(d = set_screw_pilot_d, h = 14);
        // 어깨 체결 M3 ×2 (관통 + 머리 카운터보어)
        for (x = [-6, 6]) {
            translate([x, 23.4, 29.9]) bolt_hole(3, 6.3);
            translate([x, 23.4, 34]) cylinder(d = 6.5, h = 2.2);
        }
    }
}

pl_anchor();
